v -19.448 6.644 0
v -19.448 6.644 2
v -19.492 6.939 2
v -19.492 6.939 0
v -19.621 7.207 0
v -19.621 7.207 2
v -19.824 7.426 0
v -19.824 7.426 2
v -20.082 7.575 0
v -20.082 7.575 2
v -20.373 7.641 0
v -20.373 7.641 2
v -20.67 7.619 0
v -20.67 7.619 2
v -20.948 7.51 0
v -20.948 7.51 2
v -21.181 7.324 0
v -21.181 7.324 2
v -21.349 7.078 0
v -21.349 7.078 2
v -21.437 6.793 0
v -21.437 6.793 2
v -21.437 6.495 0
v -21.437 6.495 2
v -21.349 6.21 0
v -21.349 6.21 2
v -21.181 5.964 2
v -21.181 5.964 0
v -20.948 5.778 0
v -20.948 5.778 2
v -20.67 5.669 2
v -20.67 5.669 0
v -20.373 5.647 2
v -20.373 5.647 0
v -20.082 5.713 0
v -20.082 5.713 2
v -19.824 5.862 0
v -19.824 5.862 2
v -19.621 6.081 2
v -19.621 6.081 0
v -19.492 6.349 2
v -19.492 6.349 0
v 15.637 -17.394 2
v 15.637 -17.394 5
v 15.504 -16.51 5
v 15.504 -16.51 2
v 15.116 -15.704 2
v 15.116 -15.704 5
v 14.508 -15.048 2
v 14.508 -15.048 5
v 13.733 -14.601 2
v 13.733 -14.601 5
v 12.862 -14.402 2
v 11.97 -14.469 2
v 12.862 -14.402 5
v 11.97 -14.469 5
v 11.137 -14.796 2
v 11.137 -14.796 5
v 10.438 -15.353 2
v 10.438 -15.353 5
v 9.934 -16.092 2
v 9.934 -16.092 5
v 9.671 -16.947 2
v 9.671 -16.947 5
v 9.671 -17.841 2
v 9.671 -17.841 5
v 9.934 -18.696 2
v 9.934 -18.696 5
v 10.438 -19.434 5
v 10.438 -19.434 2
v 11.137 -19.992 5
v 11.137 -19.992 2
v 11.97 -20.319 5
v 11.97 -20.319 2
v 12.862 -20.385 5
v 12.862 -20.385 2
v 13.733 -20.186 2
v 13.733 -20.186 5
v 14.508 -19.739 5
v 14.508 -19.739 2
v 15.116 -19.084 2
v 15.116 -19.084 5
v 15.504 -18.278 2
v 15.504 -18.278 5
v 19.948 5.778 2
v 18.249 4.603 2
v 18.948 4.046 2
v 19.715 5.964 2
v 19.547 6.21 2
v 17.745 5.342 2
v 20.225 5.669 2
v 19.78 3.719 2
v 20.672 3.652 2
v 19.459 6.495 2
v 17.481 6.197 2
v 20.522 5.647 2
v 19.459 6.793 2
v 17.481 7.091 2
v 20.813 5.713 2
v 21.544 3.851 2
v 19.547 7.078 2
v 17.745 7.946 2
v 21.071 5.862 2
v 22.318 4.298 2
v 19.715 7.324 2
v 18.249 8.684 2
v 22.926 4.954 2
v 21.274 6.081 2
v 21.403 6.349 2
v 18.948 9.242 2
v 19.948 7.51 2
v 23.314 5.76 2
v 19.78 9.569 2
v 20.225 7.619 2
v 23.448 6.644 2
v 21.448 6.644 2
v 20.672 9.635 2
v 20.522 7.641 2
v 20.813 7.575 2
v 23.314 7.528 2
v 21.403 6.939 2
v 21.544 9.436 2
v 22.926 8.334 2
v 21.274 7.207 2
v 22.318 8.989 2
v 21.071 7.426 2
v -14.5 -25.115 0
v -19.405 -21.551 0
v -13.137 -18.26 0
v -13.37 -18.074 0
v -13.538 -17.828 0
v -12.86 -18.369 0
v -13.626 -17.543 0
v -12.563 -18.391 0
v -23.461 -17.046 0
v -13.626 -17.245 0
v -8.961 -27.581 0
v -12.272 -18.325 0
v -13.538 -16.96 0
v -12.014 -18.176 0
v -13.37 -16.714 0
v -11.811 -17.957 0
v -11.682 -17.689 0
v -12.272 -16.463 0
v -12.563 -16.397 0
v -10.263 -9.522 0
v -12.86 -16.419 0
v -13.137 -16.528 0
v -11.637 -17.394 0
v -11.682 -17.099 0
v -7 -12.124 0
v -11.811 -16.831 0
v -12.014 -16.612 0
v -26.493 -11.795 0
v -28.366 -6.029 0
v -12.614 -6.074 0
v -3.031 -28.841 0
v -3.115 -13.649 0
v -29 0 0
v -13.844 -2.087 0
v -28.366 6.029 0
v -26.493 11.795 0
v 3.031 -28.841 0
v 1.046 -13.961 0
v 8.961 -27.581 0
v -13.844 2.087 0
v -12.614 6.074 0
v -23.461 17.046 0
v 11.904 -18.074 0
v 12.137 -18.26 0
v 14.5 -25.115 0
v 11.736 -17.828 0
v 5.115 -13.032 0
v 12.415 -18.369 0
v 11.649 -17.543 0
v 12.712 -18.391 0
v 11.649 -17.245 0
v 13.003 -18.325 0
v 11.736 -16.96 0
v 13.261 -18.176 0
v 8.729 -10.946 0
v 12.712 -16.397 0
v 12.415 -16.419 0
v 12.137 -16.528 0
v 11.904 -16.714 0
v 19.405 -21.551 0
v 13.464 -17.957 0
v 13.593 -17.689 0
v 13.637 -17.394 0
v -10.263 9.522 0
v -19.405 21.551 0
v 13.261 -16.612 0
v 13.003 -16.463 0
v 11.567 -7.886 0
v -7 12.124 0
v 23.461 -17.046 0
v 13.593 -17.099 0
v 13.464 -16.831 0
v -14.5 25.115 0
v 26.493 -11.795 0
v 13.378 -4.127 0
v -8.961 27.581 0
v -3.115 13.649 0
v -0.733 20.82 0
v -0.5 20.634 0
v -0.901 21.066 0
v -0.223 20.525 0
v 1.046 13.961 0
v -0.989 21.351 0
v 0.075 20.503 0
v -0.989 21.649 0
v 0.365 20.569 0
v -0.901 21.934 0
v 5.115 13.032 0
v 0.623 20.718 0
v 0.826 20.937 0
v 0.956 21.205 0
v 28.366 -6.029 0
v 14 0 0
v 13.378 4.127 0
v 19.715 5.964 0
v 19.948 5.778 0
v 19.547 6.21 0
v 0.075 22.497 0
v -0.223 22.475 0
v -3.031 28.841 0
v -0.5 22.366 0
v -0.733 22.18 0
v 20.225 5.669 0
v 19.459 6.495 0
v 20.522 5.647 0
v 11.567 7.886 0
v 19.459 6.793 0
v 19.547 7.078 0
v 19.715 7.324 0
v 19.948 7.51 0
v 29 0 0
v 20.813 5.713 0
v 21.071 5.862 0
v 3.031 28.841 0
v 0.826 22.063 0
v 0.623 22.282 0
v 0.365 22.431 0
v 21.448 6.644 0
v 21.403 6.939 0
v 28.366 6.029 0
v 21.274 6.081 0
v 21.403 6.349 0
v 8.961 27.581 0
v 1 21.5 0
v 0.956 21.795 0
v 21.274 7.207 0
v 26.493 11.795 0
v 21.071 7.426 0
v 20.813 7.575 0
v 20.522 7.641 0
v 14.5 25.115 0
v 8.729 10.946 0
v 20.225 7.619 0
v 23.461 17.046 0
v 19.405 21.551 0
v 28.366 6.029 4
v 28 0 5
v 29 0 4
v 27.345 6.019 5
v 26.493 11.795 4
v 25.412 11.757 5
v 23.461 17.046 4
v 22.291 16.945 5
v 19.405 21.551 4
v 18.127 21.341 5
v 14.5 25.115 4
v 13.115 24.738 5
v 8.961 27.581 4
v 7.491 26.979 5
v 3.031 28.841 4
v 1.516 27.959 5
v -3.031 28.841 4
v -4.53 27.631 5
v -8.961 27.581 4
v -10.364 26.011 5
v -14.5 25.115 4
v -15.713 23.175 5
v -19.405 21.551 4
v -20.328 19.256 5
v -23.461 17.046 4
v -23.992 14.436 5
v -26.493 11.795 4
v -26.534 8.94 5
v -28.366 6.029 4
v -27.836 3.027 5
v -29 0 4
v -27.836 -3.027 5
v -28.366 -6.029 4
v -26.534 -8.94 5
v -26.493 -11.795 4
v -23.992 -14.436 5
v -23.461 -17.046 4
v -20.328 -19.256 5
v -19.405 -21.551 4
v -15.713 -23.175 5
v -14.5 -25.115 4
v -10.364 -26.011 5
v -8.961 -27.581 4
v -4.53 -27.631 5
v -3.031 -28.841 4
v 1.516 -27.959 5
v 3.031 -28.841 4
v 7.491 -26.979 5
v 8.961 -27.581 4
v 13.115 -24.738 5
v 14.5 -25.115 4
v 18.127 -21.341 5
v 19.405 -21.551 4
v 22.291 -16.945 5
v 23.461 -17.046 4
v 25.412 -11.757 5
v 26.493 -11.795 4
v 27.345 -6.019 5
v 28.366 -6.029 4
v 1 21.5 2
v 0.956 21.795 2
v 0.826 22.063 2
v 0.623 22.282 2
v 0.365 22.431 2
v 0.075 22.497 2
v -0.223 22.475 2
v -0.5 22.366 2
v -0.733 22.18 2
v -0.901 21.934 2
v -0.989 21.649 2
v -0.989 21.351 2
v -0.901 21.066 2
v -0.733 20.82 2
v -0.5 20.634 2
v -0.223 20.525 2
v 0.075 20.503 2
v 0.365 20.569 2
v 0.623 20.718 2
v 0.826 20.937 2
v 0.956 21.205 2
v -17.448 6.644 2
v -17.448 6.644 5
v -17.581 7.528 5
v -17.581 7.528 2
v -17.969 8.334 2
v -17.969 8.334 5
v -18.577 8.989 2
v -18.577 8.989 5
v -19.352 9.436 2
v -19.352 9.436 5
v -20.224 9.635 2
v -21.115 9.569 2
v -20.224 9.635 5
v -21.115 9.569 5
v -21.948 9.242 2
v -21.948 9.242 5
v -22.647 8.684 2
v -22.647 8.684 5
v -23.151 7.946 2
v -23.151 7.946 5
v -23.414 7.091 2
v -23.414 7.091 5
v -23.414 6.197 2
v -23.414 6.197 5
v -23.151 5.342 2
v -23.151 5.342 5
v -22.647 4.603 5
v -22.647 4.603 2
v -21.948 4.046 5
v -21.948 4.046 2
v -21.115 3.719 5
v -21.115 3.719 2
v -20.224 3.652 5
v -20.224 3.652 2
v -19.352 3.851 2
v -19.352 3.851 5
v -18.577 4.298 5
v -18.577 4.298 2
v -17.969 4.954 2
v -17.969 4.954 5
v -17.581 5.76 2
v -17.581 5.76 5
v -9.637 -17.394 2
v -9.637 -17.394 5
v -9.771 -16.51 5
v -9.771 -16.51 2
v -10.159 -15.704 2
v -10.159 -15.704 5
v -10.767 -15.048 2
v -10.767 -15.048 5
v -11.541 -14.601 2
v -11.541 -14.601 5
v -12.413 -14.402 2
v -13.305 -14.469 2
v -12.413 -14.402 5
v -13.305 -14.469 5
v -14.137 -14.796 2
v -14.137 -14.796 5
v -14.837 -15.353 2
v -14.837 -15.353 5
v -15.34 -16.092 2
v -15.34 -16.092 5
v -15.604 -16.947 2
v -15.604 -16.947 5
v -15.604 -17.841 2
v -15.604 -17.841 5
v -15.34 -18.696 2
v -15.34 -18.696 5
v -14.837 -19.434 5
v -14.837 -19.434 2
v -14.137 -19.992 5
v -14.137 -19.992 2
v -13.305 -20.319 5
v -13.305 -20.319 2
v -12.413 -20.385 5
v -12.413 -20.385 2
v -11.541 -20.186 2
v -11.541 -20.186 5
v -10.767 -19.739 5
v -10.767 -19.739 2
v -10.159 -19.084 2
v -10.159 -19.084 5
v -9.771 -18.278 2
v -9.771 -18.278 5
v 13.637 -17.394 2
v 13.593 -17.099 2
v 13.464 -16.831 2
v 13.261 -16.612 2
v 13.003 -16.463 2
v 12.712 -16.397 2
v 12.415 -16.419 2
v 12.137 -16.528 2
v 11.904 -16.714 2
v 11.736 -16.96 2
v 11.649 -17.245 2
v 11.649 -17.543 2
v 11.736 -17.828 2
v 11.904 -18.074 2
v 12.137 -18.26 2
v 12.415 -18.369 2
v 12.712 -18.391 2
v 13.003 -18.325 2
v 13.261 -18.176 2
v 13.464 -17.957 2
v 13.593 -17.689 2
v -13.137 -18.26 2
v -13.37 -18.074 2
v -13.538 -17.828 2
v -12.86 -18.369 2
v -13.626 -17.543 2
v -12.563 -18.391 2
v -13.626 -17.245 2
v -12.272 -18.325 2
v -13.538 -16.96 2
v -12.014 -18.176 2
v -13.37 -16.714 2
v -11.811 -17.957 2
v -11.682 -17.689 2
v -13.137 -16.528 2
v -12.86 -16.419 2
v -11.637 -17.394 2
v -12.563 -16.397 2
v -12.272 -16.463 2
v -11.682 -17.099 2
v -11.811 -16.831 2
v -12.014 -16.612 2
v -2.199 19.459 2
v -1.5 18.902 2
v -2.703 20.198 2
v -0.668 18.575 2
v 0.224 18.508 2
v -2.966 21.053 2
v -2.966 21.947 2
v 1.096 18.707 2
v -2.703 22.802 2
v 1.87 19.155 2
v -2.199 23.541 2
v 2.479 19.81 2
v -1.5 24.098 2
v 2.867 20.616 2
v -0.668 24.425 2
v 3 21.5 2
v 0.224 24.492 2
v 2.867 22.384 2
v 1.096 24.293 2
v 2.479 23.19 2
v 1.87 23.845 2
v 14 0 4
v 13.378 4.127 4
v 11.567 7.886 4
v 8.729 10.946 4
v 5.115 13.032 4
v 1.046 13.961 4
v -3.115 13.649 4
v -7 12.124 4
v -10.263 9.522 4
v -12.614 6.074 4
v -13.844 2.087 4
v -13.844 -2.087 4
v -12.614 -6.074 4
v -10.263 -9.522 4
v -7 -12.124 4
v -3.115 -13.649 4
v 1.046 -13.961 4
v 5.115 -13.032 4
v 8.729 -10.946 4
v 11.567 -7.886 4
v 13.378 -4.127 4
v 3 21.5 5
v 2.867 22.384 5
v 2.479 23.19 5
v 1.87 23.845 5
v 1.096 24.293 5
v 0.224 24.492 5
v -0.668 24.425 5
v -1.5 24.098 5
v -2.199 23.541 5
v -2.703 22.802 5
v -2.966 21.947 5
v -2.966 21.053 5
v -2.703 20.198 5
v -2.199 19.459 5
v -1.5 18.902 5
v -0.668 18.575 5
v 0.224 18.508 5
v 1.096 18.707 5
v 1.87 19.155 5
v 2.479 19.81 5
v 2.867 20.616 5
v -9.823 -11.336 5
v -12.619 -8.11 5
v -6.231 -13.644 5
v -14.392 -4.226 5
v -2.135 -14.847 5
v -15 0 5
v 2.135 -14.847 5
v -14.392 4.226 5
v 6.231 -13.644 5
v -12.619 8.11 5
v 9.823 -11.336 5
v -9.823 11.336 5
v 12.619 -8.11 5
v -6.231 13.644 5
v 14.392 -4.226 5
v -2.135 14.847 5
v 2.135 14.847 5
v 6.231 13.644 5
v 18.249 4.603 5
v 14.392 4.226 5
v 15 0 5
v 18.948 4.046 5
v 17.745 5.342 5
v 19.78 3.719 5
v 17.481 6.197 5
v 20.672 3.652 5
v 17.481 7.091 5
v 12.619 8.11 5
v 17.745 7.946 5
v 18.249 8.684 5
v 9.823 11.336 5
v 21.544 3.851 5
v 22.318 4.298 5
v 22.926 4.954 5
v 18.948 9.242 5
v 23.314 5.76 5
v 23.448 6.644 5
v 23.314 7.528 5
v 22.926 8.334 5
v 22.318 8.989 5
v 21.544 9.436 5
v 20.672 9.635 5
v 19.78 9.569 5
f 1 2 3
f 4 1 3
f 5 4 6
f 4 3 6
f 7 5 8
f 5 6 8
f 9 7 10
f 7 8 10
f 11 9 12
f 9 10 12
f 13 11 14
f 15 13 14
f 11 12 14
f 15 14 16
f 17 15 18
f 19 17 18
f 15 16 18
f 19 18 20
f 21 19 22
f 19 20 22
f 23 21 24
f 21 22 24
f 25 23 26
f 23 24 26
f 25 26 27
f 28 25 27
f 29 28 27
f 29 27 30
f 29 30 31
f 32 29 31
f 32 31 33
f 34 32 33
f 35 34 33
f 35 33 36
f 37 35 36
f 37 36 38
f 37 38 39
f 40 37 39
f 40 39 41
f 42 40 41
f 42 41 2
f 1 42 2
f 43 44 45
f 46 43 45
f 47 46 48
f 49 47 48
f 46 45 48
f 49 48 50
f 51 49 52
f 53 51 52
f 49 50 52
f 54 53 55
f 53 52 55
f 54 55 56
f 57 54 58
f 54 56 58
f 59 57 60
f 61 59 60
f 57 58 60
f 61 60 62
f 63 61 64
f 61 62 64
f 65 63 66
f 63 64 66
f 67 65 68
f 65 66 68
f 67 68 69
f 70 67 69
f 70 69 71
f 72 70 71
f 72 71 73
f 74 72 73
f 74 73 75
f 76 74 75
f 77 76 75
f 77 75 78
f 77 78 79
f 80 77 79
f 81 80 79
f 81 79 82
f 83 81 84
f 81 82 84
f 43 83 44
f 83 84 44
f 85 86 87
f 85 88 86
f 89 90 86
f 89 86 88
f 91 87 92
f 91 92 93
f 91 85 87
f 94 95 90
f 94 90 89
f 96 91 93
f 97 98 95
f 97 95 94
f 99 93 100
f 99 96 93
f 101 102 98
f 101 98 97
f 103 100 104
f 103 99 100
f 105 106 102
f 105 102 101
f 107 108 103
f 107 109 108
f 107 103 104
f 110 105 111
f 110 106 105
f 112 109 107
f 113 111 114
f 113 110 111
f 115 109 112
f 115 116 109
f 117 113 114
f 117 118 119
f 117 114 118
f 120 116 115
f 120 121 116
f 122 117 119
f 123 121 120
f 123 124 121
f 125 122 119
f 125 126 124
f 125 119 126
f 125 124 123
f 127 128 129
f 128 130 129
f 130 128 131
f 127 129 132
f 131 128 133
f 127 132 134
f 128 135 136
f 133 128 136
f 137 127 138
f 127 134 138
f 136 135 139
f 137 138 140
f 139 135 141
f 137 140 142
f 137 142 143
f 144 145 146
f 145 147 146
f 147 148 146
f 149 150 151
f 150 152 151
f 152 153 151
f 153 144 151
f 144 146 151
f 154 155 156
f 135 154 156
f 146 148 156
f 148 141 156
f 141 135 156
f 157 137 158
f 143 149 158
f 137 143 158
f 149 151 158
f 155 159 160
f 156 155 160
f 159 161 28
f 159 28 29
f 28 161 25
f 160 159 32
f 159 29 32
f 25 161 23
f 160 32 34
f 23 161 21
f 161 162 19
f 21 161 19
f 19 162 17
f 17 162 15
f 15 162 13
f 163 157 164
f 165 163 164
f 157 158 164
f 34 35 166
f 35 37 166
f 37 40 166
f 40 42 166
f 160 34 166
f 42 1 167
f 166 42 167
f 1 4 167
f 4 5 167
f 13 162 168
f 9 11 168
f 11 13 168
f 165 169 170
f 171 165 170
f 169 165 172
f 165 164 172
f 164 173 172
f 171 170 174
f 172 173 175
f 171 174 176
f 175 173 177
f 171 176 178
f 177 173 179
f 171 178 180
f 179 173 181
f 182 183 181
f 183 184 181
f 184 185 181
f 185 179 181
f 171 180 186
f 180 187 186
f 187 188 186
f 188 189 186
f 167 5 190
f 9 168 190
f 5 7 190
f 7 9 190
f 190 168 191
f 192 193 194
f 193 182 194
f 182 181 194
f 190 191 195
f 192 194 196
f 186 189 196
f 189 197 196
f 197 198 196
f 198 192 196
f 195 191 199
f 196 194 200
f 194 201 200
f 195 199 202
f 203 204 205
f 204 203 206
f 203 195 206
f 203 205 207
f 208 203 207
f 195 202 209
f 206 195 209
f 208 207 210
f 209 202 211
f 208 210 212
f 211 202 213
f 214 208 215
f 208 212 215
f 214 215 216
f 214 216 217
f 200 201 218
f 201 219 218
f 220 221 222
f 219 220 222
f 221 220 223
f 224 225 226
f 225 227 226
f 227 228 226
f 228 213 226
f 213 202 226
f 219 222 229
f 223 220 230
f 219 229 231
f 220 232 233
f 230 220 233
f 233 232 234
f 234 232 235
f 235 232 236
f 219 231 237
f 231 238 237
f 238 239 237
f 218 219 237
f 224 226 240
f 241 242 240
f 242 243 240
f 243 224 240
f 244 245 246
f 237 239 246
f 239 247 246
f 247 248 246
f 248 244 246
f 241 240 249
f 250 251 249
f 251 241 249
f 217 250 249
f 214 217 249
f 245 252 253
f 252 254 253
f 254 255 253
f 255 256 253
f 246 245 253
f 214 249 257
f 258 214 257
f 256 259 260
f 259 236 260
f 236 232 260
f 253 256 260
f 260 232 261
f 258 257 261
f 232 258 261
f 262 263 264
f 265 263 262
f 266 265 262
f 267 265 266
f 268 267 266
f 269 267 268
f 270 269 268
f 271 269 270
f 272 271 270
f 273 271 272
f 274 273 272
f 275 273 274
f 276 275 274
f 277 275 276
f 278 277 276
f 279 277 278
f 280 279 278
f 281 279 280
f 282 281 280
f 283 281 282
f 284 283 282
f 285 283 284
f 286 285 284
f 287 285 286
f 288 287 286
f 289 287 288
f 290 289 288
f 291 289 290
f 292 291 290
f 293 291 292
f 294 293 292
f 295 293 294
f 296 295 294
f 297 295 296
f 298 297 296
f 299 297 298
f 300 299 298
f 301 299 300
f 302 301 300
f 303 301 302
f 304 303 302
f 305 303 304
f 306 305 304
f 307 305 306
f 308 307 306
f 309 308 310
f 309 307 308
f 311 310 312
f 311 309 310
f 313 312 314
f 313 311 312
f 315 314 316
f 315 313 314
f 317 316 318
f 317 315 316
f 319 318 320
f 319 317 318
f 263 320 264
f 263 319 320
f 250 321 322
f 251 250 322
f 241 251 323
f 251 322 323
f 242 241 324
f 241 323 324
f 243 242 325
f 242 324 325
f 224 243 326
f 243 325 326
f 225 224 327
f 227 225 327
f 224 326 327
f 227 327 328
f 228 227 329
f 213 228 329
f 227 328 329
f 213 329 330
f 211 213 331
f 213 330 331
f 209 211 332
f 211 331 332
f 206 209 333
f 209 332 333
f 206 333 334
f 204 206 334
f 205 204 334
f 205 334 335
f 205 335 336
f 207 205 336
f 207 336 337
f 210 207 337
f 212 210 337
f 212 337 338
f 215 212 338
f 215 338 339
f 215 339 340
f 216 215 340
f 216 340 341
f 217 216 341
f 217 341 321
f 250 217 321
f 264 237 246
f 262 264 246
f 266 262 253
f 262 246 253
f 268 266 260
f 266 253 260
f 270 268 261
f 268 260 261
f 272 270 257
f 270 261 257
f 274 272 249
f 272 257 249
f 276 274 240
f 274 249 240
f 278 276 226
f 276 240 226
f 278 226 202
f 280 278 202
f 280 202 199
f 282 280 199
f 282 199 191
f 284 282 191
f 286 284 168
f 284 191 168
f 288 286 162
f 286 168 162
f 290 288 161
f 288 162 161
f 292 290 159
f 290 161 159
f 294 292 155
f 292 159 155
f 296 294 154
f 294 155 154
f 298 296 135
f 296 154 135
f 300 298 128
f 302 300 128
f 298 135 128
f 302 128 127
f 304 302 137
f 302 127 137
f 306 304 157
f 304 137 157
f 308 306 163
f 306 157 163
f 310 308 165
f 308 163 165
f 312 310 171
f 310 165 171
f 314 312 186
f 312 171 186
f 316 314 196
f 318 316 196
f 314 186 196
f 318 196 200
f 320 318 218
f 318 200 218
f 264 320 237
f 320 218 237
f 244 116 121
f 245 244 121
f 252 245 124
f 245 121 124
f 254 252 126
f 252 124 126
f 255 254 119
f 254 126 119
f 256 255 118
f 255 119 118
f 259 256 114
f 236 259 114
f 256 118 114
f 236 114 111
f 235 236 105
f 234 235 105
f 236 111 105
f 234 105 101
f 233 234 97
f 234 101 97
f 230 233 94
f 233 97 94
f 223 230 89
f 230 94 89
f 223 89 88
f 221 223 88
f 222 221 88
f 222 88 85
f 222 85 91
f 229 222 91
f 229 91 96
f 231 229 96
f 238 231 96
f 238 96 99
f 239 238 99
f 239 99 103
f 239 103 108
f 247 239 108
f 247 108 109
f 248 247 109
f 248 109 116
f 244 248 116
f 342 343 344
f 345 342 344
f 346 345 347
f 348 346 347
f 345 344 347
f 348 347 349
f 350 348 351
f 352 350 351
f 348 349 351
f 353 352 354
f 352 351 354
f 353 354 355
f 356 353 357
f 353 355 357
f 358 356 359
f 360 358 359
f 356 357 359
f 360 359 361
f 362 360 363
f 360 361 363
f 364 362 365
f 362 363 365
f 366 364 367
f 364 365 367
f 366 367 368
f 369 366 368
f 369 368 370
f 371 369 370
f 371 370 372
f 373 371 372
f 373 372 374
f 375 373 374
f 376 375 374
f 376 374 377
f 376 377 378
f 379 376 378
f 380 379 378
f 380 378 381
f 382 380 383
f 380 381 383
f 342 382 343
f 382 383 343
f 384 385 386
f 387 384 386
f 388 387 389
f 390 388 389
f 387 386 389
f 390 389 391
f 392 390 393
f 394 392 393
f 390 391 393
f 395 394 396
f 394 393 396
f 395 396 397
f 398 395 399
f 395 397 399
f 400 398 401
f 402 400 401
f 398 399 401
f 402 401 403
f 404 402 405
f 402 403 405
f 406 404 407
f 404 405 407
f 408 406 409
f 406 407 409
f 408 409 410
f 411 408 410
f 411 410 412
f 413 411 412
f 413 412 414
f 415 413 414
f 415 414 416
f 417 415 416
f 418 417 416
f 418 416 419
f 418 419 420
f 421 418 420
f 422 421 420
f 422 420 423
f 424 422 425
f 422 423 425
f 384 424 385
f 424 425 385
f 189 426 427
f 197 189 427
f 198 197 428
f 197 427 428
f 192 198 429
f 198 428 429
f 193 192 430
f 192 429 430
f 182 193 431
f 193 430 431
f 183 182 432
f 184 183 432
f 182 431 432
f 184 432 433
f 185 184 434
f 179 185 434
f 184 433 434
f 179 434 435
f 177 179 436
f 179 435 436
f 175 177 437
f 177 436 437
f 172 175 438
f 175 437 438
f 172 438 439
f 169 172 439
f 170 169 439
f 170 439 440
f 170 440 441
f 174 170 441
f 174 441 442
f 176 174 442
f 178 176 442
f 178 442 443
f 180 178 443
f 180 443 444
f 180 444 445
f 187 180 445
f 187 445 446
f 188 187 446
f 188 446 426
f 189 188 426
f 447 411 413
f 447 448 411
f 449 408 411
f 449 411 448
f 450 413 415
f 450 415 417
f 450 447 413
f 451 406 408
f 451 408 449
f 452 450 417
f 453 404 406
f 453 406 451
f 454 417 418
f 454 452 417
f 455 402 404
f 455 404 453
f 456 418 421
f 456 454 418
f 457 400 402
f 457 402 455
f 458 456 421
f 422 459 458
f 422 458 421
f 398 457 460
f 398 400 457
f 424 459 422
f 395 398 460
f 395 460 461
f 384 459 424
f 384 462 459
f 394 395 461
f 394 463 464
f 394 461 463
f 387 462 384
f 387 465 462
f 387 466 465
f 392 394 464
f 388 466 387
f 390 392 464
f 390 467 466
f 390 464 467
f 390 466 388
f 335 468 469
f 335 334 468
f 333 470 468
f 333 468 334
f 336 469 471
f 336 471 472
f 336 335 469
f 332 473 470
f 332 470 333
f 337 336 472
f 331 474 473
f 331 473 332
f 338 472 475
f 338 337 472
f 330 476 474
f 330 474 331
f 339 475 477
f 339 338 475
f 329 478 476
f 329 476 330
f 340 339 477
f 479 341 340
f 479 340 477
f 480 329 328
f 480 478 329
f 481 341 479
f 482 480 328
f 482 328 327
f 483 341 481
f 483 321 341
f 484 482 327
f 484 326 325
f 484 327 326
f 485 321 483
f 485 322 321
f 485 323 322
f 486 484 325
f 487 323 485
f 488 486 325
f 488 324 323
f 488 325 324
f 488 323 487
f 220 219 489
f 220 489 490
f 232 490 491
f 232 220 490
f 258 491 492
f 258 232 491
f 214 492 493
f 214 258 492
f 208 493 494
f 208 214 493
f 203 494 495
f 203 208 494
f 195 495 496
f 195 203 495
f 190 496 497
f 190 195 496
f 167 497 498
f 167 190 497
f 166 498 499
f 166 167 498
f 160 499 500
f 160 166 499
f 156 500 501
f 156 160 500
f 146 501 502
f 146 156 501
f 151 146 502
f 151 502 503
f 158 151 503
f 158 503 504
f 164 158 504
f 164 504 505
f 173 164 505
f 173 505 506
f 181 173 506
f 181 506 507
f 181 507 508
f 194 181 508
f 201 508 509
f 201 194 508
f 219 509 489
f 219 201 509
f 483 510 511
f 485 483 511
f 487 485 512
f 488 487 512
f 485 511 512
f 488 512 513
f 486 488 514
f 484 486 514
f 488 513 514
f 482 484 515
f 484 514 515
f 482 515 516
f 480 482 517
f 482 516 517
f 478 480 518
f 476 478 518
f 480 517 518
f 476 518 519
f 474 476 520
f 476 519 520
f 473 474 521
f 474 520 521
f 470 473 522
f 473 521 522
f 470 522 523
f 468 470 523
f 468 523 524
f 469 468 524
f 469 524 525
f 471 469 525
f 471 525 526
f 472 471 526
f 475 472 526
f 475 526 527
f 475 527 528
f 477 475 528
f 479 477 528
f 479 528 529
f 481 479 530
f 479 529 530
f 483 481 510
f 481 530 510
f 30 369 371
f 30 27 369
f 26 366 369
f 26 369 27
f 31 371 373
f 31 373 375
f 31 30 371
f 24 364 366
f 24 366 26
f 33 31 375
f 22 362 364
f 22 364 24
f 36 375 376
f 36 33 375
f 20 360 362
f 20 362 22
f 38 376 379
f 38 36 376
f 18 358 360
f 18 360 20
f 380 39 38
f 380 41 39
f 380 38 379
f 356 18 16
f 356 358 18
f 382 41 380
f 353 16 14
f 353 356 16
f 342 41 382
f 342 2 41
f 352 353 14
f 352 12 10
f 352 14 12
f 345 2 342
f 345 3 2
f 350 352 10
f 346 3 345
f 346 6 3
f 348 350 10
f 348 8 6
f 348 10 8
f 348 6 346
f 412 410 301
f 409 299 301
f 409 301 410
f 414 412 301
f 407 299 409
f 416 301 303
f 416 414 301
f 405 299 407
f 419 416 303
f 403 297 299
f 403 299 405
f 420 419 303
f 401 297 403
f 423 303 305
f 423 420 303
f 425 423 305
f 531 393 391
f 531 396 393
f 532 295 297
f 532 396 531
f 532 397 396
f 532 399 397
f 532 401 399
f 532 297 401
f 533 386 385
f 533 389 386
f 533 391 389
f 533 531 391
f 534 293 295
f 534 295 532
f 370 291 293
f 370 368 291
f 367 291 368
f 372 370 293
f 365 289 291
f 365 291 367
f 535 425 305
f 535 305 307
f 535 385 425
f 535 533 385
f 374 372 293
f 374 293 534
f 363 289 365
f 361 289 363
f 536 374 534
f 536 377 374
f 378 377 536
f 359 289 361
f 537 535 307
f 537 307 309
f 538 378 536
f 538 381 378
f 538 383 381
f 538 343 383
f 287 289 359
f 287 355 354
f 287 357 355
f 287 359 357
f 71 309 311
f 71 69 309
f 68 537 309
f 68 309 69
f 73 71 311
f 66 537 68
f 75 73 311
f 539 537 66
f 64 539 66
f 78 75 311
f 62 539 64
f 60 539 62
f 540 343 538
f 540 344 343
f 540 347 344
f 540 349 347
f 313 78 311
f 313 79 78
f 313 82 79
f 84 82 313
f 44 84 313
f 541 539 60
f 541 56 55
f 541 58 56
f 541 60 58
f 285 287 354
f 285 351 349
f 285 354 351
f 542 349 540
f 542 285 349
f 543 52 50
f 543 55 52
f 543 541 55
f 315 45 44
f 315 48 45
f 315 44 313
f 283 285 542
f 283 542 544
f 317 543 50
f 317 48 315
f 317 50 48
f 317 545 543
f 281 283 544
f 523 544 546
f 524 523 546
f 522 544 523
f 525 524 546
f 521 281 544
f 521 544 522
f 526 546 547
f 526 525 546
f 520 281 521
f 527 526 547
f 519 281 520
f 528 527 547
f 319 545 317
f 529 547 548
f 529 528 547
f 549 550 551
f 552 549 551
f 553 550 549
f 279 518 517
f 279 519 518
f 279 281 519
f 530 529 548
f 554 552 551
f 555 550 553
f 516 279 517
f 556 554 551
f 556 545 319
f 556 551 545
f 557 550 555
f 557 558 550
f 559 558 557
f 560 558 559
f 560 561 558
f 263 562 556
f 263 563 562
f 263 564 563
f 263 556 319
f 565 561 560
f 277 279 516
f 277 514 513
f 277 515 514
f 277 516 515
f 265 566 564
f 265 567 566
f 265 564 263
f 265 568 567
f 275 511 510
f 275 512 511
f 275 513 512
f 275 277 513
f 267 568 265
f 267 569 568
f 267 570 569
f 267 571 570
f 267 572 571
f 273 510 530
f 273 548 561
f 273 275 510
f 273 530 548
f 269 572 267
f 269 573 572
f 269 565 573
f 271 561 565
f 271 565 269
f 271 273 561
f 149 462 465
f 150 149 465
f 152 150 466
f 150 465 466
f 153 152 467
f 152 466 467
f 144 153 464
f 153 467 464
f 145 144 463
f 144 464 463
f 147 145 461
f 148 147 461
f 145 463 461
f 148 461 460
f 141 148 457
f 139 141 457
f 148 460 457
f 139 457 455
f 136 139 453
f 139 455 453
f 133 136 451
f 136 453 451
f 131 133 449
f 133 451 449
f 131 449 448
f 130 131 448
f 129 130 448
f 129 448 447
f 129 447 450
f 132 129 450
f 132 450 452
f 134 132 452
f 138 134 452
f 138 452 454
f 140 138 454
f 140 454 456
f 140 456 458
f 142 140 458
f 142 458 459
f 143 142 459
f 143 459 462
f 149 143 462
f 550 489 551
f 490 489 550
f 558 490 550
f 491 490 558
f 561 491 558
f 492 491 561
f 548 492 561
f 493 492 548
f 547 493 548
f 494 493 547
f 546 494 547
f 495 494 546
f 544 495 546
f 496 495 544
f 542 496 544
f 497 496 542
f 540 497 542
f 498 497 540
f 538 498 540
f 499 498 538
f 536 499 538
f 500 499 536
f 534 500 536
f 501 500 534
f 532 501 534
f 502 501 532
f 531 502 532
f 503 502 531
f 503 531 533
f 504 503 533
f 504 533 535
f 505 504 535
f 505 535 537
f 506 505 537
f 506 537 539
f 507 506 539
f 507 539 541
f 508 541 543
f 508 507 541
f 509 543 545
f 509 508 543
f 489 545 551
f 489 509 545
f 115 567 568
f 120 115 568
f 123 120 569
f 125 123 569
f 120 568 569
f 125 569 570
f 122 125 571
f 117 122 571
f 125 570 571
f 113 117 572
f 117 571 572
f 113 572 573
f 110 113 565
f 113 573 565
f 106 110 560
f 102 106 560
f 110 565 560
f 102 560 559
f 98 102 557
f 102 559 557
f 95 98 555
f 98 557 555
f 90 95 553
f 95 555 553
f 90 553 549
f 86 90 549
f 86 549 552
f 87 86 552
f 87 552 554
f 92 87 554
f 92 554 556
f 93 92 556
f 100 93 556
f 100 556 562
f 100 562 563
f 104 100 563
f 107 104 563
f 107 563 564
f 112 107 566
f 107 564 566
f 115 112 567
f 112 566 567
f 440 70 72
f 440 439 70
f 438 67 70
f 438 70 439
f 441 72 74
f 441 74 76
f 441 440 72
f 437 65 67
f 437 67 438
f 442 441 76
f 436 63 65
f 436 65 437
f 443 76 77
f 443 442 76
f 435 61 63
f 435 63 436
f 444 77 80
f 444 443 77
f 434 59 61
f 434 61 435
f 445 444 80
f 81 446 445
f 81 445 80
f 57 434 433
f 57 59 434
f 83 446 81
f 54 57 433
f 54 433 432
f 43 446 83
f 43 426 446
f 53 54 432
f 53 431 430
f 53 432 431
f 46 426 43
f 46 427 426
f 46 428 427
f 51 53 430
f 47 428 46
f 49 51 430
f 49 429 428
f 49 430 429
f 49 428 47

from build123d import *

# Parameters (mm, degrees)
F0_R     = 29
F0_R_2   = 14
F1_DEPTH = 5
F2_R     = 3
F3_DEPTH = 3
F4_R     = 1
F5_DEPTH = 3
F6_SIZE  = 1


with BuildPart() as f1:
    # F0 (on Top) → F1 (new body)
    with BuildSketch(Plane.XY):
        Circle(F0_R)
        Circle(F0_R_2, mode=Mode.SUBTRACT)
    extrude(amount=F1_DEPTH)

    # F2 (on face) → F3 (cut)
    with BuildSketch(Plane.XY.offset(5)):
        with Locations((0, 21.5)):
            Circle(F2_R)
        with Locations((-20.447715, 6.643865)):
            Circle(F2_R)
        with Locations((-12.637383, -17.393865)):
            Circle(F2_R)
        with Locations((12.637383, -17.393865)):
            Circle(F2_R)
        with Locations((20.447715, 6.643865)):
            Circle(F2_R)
    extrude(amount=-F3_DEPTH, mode=Mode.SUBTRACT)

    # F4 (on face) → F5 (cut)
    with BuildSketch(Plane.XY.offset(2)):
        with Locations((0, 21.5)):
            Circle(F4_R)
        with Locations((-20.447715, 6.643865)):
            Circle(F4_R)
        with Locations((-12.637383, -17.393865)):
            Circle(F4_R)
        with Locations((12.637383, -17.393865)):
            Circle(F4_R)
        with Locations((20.447715, 6.643865)):
            Circle(F4_R)
    extrude(amount=-F5_DEPTH, mode=Mode.SUBTRACT)

    # F6
    f6_edges = [f1.edges().sort_by_distance(p)[0] for p in [
        (-29, 0, 5),
        (-14, 0, 5),
    ]]
    chamfer(f6_edges, length=F6_SIZE)


solid = f1.part
